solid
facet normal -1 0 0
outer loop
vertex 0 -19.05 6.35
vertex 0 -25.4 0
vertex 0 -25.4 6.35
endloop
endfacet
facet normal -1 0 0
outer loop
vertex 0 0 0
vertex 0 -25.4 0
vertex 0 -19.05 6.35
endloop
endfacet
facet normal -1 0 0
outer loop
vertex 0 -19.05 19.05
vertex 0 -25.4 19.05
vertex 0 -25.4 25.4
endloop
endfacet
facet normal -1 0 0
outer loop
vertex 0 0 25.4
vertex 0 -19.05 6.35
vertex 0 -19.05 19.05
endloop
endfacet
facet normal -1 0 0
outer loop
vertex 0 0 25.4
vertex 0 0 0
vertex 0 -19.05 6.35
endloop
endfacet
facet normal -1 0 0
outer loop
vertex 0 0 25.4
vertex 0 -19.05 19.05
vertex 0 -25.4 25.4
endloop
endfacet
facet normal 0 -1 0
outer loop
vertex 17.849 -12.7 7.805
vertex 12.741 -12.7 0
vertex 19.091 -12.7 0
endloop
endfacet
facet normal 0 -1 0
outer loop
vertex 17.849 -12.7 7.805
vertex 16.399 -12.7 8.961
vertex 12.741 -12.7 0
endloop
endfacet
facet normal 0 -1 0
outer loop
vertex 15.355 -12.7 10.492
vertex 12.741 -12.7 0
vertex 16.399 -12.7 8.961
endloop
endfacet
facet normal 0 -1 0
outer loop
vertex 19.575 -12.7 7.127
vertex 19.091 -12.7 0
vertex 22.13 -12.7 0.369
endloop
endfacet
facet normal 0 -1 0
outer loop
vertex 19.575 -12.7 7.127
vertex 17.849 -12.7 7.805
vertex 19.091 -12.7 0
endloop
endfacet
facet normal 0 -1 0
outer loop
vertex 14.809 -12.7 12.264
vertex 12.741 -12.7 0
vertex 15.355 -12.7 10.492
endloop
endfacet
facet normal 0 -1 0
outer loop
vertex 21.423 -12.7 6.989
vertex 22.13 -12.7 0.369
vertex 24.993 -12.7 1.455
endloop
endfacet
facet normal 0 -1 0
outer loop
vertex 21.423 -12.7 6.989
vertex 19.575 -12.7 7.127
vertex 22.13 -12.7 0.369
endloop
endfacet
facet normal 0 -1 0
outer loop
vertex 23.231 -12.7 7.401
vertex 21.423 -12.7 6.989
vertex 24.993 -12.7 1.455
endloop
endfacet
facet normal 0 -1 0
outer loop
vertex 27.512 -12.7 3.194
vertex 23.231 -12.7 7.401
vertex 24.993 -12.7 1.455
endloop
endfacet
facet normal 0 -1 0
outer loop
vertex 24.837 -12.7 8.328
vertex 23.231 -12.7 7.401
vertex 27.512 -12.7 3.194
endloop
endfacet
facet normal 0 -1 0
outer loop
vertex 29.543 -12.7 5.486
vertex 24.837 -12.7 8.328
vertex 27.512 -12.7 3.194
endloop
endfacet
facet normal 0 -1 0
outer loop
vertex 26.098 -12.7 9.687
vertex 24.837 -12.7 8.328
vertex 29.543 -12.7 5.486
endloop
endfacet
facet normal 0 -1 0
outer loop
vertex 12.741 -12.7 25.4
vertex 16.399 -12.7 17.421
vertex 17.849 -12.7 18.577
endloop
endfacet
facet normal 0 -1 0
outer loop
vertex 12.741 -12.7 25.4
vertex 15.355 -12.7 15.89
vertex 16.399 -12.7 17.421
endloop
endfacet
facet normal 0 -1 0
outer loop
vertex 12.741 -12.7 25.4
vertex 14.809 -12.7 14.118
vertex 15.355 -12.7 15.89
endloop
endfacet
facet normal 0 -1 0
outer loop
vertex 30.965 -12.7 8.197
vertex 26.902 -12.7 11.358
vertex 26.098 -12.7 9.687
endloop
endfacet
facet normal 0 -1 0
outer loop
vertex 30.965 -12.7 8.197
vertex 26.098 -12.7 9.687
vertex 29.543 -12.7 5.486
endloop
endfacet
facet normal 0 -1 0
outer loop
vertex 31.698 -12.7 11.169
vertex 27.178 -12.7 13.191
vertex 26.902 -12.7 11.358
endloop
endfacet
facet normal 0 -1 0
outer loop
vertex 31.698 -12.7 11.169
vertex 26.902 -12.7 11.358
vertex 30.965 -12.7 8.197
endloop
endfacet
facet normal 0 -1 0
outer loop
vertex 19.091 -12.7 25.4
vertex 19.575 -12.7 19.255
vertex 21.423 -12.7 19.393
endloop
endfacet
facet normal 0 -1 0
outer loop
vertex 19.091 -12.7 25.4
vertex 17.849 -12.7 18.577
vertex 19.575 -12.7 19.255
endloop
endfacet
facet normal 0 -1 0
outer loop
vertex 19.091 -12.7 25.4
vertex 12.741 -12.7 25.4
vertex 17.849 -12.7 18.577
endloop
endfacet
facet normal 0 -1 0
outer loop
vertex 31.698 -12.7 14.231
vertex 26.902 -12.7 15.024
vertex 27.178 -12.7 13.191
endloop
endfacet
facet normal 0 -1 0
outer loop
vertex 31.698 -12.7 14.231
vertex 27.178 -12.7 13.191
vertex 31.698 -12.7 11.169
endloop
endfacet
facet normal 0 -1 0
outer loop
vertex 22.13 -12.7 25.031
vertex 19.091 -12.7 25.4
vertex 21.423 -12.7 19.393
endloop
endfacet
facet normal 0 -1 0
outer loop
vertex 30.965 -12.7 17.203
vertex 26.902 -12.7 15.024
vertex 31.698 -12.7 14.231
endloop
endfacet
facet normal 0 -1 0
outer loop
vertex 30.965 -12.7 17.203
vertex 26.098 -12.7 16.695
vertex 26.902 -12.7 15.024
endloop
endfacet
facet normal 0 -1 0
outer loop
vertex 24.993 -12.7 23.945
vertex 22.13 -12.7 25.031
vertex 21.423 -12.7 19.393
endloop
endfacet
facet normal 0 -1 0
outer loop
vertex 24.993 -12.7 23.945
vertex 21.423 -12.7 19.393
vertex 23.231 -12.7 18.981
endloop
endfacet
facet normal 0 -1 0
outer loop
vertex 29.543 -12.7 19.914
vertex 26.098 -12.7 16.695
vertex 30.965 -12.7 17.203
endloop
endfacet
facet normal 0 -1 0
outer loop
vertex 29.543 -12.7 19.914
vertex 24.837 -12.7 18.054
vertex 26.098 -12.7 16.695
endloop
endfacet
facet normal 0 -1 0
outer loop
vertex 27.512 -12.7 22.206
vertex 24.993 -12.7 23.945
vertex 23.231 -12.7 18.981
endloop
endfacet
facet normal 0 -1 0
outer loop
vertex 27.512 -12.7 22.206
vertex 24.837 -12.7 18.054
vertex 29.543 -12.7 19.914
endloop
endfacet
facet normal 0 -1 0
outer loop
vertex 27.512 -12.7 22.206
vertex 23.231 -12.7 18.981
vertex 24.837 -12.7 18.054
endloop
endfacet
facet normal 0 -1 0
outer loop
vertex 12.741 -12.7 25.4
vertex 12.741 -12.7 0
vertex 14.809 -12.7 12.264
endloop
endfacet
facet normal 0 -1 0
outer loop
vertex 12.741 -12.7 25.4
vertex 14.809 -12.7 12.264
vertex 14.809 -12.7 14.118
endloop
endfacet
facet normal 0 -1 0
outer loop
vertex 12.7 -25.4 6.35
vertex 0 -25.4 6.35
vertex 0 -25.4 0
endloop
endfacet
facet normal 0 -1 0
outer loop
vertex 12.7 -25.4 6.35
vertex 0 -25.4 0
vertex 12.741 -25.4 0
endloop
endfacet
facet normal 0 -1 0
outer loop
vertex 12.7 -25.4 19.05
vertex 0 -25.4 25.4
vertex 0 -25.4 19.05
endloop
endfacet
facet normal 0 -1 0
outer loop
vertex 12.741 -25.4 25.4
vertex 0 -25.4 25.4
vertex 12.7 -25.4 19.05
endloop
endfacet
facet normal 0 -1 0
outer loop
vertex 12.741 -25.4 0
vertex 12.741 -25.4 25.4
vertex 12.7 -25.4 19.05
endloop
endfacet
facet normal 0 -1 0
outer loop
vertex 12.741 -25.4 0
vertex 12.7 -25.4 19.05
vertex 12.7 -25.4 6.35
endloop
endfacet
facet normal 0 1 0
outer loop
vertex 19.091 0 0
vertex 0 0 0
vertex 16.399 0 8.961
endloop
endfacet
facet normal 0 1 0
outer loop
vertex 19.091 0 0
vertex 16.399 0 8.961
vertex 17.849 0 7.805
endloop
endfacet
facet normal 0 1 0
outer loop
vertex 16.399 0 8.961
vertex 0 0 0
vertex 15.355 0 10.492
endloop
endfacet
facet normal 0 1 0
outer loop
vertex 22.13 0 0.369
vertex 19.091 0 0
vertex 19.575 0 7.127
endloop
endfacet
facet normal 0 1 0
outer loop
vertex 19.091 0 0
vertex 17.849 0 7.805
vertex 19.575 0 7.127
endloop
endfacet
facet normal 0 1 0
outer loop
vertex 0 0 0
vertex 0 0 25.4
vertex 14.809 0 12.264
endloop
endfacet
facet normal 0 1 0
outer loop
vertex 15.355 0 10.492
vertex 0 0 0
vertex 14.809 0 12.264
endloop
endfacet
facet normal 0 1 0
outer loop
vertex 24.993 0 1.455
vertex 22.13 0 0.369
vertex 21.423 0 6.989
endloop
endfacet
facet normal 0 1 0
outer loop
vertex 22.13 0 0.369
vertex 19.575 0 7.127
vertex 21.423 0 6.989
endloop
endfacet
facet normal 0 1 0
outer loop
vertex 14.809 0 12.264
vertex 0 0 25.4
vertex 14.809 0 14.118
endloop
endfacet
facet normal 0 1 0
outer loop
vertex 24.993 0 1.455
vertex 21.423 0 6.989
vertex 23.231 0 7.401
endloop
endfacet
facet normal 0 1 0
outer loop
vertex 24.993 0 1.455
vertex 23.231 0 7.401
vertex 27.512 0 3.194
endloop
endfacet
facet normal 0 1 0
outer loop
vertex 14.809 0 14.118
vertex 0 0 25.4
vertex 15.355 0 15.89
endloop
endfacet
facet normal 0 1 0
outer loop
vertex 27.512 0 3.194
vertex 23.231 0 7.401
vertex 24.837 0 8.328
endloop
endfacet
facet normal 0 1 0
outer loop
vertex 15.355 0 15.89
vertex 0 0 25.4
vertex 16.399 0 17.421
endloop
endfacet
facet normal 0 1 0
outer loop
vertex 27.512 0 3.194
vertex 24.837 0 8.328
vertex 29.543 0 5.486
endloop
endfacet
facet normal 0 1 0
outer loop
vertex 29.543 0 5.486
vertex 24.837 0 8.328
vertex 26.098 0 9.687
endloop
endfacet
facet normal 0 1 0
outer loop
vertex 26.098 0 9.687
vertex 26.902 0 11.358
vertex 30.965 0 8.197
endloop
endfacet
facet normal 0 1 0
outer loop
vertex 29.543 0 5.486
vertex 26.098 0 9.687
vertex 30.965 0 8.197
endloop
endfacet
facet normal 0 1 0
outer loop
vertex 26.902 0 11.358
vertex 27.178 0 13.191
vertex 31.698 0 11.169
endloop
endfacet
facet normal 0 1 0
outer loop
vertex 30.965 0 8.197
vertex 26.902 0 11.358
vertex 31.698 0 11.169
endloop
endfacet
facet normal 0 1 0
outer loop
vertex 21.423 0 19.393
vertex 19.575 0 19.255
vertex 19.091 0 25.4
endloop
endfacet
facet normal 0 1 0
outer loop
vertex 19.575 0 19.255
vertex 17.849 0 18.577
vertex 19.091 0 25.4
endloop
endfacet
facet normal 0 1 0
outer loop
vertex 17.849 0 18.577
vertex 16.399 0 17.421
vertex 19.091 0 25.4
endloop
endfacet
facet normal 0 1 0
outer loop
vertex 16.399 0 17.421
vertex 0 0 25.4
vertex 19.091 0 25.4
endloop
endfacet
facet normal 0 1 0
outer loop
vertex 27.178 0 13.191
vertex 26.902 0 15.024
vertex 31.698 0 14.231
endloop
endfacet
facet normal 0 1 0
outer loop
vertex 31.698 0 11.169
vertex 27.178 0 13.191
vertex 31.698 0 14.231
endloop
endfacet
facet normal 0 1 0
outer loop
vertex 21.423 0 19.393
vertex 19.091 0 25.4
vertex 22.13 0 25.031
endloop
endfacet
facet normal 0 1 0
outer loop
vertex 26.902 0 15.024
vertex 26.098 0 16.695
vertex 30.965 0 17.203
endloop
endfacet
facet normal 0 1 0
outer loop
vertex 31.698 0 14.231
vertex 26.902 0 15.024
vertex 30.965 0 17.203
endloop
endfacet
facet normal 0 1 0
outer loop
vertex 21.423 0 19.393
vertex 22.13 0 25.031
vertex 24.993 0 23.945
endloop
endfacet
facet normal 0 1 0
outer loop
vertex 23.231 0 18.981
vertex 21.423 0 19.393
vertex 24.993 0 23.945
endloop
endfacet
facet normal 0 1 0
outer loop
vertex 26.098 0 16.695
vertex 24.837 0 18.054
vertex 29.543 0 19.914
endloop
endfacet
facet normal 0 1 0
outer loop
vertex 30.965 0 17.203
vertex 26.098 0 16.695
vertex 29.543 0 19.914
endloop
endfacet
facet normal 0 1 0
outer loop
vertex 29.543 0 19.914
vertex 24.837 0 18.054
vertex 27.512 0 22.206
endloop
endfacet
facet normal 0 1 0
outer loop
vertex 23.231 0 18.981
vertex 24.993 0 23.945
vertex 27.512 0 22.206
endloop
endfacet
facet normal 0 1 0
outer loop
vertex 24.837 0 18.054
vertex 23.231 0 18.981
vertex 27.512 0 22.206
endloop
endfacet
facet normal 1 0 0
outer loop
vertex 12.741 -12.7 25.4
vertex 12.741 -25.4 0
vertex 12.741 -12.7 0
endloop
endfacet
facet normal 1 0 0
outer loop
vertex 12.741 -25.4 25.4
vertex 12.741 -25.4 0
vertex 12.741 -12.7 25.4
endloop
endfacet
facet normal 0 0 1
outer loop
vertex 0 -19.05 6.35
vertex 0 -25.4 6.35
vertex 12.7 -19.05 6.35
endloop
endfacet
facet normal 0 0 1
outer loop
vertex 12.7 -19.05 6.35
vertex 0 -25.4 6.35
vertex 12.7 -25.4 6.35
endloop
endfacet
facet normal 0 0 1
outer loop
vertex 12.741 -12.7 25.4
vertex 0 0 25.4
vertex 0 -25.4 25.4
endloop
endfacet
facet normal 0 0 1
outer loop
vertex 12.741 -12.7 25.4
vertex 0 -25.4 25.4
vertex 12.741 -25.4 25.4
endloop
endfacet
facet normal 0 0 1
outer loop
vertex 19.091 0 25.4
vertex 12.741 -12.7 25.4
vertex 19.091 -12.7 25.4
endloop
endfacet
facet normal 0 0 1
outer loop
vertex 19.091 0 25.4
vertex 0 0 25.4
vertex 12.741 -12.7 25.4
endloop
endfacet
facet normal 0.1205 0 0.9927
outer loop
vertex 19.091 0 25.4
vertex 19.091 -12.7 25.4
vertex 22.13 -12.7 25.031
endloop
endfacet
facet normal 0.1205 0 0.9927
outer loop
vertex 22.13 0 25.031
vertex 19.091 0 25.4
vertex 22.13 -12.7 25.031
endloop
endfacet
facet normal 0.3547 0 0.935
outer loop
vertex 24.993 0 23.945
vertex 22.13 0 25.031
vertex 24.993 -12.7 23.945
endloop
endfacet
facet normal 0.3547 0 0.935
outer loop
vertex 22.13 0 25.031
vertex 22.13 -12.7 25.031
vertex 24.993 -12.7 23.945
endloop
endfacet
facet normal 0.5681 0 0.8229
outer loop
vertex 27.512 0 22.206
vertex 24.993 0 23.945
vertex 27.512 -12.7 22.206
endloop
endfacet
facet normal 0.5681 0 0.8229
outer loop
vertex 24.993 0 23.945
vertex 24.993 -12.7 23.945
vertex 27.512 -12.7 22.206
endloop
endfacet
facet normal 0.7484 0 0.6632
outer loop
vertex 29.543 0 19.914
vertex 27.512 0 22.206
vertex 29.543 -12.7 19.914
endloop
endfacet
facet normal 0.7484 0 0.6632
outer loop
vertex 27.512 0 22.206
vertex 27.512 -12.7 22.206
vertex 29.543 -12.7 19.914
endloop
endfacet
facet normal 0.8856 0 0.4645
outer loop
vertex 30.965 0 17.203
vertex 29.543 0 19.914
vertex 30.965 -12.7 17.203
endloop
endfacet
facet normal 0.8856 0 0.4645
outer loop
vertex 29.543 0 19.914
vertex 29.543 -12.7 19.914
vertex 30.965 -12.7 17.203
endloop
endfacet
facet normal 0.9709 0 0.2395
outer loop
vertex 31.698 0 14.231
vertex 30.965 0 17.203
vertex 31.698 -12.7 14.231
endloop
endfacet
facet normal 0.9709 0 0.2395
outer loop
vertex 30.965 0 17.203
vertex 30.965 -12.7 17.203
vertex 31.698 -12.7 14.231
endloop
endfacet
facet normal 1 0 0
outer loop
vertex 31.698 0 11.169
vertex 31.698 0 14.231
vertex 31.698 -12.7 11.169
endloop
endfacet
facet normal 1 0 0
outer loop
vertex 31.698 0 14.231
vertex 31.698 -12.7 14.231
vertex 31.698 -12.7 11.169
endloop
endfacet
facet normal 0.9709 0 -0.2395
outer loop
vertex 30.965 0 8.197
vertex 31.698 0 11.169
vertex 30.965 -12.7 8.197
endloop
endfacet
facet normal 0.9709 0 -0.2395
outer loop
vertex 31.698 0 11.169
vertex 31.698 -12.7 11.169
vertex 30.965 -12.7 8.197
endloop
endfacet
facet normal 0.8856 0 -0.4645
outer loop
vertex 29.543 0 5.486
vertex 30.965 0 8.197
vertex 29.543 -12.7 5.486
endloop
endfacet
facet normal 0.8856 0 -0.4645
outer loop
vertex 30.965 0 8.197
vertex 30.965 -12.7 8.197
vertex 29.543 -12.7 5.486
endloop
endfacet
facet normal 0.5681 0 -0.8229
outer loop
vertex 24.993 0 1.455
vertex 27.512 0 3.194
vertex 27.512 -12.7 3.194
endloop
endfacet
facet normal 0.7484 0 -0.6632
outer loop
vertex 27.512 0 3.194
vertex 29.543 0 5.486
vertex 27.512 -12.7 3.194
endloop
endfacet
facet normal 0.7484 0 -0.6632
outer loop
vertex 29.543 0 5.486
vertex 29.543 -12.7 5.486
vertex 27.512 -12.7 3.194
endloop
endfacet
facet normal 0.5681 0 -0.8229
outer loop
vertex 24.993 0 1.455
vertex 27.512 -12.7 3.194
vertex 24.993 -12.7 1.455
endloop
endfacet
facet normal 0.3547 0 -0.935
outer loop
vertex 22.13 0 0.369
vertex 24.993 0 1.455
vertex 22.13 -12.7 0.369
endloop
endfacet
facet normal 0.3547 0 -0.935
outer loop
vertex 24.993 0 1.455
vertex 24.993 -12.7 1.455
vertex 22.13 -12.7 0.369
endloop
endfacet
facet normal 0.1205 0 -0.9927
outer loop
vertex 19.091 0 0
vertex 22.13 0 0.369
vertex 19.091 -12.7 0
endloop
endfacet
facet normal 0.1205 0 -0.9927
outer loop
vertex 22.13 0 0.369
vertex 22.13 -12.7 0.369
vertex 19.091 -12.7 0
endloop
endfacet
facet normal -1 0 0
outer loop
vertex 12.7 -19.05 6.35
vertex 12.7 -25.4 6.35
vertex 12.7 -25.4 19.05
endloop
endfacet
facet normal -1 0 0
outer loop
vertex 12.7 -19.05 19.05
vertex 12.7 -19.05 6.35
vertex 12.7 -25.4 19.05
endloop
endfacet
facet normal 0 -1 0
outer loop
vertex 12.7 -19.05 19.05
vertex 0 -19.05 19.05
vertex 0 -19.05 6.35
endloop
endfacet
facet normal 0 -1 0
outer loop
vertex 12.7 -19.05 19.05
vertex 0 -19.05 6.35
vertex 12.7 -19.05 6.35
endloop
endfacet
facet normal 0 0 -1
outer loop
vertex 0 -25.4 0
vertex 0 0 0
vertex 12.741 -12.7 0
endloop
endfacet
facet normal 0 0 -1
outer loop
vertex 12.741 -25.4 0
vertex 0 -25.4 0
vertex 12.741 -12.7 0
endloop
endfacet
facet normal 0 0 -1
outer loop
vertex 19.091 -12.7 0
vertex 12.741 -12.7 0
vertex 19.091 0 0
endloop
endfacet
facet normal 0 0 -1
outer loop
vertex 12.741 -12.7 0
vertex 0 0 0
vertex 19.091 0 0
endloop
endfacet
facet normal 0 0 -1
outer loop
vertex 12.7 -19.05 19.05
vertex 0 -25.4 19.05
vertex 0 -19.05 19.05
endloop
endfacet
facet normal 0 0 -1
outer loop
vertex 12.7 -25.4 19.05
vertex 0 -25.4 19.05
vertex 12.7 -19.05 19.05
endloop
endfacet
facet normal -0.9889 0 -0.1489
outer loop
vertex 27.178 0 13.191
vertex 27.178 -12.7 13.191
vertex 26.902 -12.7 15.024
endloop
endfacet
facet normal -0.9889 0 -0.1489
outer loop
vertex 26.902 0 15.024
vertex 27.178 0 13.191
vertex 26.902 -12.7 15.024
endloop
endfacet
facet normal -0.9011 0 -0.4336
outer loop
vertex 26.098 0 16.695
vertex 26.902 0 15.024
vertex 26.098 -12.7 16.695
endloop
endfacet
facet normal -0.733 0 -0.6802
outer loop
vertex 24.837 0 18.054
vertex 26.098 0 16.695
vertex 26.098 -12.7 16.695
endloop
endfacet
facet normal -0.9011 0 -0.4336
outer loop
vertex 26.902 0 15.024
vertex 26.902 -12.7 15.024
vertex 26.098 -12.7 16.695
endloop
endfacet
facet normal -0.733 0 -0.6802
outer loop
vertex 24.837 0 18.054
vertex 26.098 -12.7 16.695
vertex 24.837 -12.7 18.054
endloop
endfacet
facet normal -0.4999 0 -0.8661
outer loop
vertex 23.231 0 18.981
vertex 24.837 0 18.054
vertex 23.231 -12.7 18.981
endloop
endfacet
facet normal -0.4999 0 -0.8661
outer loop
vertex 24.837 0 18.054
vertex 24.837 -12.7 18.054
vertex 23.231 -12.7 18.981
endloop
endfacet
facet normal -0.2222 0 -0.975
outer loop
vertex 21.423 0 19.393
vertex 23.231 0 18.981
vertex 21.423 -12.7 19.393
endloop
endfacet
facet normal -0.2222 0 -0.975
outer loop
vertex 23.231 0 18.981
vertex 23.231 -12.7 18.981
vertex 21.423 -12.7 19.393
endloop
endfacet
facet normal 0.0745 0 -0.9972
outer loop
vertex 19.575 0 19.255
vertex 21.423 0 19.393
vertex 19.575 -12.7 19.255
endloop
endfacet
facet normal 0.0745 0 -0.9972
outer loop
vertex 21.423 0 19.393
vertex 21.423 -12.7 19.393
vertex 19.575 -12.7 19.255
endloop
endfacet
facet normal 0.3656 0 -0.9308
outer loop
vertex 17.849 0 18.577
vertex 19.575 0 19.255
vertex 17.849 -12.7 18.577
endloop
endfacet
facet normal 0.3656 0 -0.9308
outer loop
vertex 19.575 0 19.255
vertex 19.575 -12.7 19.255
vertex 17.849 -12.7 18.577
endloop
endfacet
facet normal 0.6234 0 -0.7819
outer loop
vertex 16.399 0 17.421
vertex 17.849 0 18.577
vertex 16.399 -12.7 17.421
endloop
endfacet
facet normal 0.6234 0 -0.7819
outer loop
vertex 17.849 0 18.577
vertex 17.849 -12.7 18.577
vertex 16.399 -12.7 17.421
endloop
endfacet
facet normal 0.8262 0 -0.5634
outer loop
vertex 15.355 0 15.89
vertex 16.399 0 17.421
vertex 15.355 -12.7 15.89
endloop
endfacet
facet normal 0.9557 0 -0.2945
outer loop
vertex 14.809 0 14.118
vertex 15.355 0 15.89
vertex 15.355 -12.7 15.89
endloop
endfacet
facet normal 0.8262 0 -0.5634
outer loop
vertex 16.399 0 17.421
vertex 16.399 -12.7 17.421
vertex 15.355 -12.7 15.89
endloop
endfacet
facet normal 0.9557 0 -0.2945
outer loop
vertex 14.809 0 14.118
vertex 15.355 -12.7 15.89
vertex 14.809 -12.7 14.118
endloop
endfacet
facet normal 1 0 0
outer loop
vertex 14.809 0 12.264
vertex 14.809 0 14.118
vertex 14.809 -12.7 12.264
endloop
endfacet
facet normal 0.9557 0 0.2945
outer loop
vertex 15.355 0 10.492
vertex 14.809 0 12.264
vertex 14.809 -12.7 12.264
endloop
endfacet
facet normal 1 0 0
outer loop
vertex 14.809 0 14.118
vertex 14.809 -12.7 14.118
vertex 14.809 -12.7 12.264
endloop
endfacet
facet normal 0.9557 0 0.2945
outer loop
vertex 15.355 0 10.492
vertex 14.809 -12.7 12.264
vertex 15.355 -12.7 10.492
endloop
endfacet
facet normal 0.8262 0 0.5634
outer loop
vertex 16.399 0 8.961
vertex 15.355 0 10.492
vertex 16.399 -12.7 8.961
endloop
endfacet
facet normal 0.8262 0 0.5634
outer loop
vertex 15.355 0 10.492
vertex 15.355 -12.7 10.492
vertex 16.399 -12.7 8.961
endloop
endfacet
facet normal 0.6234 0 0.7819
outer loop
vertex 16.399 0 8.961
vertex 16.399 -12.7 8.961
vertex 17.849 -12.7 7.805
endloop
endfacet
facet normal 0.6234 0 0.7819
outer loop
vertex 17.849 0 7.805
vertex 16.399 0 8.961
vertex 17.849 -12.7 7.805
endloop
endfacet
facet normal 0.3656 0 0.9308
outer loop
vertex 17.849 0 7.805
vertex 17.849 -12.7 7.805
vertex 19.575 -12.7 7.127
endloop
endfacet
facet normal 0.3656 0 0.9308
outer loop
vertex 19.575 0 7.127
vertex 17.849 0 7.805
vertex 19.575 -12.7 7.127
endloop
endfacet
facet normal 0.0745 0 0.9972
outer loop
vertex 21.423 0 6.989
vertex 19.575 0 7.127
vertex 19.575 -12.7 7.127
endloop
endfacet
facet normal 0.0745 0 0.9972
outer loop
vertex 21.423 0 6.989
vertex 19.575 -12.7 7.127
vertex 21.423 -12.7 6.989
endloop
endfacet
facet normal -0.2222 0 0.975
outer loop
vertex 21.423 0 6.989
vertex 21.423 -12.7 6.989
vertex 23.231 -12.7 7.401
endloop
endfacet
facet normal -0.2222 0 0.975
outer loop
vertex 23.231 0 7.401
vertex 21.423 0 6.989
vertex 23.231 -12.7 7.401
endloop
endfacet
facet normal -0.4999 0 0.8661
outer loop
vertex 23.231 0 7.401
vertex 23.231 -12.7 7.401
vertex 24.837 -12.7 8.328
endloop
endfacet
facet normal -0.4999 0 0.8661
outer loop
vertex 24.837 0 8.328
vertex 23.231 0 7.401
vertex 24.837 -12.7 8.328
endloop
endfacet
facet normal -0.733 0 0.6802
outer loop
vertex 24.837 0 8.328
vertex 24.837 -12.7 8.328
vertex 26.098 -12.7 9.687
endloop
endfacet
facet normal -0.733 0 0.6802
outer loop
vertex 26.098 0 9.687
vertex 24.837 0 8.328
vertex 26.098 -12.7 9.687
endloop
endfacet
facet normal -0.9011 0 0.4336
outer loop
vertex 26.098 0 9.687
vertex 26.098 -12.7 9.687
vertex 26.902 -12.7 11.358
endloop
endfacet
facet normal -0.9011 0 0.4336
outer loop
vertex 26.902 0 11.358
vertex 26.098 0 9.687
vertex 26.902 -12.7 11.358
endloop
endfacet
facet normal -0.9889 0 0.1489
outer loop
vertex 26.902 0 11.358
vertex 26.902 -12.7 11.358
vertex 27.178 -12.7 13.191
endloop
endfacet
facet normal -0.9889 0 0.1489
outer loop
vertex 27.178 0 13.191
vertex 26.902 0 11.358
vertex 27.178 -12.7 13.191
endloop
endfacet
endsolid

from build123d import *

# Parameters (mm, degrees)
F0_W     = 44.45
F0_H     = 25.4
F1_DEPTH = 25.4
F2_W     = 12.7
F2_H     = 12.7
F3_DEPTH = 6.35
F4_W     = 31.7093898326
F4_H     = 25.4
F5_DEPTH = 12.7
F7_DEPTH = 25.4
F8_R     = 6.2195299404
F9_DEPTH = 25.4


with BuildPart() as f1:
    # F0 (on Front) → F1 (new body)
    with BuildSketch(Plane.XZ):
        with Locations((22.225, 12.7)):
            Rectangle(F0_W, F0_H)
    extrude(amount=F1_DEPTH)

    # F2 (on face) → F3 (cut)
    with BuildSketch(Plane.XZ.offset(25.4)):
        with Locations((6.35, 12.7)):
            Rectangle(F2_W, F2_H)
    extrude(amount=-F3_DEPTH, mode=Mode.SUBTRACT)

    # F4 (on face) → F5 (cut)
    with BuildSketch(Plane.XZ.offset(25.4)):
        with Locations((28.5953050837, 12.7)):
            Rectangle(F4_W, F4_H)
    extrude(amount=-F5_DEPTH, mode=Mode.SUBTRACT)

    # F6 (on face) → F7 (cut)
    with BuildSketch(Plane.XZ.offset(12.7)):
        with BuildLine():
            Line((44.45, 25.4), (19.0906101674, 25.4))
            ThreePointArc((19.0906101674, 25.4), (31.7906101674, 12.7), (19.0906101674, 0))
            Line((19.0906101674, 0), (44.45, 0))
            Line((44.45, 0), (44.45, 25.4))
        make_face()
    extrude(amount=-F7_DEPTH, mode=Mode.SUBTRACT)

    # F8 (on face) → F9 (cut)
    with BuildSketch(Plane.XZ.offset(12.7)):
        with Locations((20.9586918354, 13.1910173222)):
            Circle(F8_R)
    extrude(amount=-F9_DEPTH, mode=Mode.SUBTRACT)


solid = f1.part
